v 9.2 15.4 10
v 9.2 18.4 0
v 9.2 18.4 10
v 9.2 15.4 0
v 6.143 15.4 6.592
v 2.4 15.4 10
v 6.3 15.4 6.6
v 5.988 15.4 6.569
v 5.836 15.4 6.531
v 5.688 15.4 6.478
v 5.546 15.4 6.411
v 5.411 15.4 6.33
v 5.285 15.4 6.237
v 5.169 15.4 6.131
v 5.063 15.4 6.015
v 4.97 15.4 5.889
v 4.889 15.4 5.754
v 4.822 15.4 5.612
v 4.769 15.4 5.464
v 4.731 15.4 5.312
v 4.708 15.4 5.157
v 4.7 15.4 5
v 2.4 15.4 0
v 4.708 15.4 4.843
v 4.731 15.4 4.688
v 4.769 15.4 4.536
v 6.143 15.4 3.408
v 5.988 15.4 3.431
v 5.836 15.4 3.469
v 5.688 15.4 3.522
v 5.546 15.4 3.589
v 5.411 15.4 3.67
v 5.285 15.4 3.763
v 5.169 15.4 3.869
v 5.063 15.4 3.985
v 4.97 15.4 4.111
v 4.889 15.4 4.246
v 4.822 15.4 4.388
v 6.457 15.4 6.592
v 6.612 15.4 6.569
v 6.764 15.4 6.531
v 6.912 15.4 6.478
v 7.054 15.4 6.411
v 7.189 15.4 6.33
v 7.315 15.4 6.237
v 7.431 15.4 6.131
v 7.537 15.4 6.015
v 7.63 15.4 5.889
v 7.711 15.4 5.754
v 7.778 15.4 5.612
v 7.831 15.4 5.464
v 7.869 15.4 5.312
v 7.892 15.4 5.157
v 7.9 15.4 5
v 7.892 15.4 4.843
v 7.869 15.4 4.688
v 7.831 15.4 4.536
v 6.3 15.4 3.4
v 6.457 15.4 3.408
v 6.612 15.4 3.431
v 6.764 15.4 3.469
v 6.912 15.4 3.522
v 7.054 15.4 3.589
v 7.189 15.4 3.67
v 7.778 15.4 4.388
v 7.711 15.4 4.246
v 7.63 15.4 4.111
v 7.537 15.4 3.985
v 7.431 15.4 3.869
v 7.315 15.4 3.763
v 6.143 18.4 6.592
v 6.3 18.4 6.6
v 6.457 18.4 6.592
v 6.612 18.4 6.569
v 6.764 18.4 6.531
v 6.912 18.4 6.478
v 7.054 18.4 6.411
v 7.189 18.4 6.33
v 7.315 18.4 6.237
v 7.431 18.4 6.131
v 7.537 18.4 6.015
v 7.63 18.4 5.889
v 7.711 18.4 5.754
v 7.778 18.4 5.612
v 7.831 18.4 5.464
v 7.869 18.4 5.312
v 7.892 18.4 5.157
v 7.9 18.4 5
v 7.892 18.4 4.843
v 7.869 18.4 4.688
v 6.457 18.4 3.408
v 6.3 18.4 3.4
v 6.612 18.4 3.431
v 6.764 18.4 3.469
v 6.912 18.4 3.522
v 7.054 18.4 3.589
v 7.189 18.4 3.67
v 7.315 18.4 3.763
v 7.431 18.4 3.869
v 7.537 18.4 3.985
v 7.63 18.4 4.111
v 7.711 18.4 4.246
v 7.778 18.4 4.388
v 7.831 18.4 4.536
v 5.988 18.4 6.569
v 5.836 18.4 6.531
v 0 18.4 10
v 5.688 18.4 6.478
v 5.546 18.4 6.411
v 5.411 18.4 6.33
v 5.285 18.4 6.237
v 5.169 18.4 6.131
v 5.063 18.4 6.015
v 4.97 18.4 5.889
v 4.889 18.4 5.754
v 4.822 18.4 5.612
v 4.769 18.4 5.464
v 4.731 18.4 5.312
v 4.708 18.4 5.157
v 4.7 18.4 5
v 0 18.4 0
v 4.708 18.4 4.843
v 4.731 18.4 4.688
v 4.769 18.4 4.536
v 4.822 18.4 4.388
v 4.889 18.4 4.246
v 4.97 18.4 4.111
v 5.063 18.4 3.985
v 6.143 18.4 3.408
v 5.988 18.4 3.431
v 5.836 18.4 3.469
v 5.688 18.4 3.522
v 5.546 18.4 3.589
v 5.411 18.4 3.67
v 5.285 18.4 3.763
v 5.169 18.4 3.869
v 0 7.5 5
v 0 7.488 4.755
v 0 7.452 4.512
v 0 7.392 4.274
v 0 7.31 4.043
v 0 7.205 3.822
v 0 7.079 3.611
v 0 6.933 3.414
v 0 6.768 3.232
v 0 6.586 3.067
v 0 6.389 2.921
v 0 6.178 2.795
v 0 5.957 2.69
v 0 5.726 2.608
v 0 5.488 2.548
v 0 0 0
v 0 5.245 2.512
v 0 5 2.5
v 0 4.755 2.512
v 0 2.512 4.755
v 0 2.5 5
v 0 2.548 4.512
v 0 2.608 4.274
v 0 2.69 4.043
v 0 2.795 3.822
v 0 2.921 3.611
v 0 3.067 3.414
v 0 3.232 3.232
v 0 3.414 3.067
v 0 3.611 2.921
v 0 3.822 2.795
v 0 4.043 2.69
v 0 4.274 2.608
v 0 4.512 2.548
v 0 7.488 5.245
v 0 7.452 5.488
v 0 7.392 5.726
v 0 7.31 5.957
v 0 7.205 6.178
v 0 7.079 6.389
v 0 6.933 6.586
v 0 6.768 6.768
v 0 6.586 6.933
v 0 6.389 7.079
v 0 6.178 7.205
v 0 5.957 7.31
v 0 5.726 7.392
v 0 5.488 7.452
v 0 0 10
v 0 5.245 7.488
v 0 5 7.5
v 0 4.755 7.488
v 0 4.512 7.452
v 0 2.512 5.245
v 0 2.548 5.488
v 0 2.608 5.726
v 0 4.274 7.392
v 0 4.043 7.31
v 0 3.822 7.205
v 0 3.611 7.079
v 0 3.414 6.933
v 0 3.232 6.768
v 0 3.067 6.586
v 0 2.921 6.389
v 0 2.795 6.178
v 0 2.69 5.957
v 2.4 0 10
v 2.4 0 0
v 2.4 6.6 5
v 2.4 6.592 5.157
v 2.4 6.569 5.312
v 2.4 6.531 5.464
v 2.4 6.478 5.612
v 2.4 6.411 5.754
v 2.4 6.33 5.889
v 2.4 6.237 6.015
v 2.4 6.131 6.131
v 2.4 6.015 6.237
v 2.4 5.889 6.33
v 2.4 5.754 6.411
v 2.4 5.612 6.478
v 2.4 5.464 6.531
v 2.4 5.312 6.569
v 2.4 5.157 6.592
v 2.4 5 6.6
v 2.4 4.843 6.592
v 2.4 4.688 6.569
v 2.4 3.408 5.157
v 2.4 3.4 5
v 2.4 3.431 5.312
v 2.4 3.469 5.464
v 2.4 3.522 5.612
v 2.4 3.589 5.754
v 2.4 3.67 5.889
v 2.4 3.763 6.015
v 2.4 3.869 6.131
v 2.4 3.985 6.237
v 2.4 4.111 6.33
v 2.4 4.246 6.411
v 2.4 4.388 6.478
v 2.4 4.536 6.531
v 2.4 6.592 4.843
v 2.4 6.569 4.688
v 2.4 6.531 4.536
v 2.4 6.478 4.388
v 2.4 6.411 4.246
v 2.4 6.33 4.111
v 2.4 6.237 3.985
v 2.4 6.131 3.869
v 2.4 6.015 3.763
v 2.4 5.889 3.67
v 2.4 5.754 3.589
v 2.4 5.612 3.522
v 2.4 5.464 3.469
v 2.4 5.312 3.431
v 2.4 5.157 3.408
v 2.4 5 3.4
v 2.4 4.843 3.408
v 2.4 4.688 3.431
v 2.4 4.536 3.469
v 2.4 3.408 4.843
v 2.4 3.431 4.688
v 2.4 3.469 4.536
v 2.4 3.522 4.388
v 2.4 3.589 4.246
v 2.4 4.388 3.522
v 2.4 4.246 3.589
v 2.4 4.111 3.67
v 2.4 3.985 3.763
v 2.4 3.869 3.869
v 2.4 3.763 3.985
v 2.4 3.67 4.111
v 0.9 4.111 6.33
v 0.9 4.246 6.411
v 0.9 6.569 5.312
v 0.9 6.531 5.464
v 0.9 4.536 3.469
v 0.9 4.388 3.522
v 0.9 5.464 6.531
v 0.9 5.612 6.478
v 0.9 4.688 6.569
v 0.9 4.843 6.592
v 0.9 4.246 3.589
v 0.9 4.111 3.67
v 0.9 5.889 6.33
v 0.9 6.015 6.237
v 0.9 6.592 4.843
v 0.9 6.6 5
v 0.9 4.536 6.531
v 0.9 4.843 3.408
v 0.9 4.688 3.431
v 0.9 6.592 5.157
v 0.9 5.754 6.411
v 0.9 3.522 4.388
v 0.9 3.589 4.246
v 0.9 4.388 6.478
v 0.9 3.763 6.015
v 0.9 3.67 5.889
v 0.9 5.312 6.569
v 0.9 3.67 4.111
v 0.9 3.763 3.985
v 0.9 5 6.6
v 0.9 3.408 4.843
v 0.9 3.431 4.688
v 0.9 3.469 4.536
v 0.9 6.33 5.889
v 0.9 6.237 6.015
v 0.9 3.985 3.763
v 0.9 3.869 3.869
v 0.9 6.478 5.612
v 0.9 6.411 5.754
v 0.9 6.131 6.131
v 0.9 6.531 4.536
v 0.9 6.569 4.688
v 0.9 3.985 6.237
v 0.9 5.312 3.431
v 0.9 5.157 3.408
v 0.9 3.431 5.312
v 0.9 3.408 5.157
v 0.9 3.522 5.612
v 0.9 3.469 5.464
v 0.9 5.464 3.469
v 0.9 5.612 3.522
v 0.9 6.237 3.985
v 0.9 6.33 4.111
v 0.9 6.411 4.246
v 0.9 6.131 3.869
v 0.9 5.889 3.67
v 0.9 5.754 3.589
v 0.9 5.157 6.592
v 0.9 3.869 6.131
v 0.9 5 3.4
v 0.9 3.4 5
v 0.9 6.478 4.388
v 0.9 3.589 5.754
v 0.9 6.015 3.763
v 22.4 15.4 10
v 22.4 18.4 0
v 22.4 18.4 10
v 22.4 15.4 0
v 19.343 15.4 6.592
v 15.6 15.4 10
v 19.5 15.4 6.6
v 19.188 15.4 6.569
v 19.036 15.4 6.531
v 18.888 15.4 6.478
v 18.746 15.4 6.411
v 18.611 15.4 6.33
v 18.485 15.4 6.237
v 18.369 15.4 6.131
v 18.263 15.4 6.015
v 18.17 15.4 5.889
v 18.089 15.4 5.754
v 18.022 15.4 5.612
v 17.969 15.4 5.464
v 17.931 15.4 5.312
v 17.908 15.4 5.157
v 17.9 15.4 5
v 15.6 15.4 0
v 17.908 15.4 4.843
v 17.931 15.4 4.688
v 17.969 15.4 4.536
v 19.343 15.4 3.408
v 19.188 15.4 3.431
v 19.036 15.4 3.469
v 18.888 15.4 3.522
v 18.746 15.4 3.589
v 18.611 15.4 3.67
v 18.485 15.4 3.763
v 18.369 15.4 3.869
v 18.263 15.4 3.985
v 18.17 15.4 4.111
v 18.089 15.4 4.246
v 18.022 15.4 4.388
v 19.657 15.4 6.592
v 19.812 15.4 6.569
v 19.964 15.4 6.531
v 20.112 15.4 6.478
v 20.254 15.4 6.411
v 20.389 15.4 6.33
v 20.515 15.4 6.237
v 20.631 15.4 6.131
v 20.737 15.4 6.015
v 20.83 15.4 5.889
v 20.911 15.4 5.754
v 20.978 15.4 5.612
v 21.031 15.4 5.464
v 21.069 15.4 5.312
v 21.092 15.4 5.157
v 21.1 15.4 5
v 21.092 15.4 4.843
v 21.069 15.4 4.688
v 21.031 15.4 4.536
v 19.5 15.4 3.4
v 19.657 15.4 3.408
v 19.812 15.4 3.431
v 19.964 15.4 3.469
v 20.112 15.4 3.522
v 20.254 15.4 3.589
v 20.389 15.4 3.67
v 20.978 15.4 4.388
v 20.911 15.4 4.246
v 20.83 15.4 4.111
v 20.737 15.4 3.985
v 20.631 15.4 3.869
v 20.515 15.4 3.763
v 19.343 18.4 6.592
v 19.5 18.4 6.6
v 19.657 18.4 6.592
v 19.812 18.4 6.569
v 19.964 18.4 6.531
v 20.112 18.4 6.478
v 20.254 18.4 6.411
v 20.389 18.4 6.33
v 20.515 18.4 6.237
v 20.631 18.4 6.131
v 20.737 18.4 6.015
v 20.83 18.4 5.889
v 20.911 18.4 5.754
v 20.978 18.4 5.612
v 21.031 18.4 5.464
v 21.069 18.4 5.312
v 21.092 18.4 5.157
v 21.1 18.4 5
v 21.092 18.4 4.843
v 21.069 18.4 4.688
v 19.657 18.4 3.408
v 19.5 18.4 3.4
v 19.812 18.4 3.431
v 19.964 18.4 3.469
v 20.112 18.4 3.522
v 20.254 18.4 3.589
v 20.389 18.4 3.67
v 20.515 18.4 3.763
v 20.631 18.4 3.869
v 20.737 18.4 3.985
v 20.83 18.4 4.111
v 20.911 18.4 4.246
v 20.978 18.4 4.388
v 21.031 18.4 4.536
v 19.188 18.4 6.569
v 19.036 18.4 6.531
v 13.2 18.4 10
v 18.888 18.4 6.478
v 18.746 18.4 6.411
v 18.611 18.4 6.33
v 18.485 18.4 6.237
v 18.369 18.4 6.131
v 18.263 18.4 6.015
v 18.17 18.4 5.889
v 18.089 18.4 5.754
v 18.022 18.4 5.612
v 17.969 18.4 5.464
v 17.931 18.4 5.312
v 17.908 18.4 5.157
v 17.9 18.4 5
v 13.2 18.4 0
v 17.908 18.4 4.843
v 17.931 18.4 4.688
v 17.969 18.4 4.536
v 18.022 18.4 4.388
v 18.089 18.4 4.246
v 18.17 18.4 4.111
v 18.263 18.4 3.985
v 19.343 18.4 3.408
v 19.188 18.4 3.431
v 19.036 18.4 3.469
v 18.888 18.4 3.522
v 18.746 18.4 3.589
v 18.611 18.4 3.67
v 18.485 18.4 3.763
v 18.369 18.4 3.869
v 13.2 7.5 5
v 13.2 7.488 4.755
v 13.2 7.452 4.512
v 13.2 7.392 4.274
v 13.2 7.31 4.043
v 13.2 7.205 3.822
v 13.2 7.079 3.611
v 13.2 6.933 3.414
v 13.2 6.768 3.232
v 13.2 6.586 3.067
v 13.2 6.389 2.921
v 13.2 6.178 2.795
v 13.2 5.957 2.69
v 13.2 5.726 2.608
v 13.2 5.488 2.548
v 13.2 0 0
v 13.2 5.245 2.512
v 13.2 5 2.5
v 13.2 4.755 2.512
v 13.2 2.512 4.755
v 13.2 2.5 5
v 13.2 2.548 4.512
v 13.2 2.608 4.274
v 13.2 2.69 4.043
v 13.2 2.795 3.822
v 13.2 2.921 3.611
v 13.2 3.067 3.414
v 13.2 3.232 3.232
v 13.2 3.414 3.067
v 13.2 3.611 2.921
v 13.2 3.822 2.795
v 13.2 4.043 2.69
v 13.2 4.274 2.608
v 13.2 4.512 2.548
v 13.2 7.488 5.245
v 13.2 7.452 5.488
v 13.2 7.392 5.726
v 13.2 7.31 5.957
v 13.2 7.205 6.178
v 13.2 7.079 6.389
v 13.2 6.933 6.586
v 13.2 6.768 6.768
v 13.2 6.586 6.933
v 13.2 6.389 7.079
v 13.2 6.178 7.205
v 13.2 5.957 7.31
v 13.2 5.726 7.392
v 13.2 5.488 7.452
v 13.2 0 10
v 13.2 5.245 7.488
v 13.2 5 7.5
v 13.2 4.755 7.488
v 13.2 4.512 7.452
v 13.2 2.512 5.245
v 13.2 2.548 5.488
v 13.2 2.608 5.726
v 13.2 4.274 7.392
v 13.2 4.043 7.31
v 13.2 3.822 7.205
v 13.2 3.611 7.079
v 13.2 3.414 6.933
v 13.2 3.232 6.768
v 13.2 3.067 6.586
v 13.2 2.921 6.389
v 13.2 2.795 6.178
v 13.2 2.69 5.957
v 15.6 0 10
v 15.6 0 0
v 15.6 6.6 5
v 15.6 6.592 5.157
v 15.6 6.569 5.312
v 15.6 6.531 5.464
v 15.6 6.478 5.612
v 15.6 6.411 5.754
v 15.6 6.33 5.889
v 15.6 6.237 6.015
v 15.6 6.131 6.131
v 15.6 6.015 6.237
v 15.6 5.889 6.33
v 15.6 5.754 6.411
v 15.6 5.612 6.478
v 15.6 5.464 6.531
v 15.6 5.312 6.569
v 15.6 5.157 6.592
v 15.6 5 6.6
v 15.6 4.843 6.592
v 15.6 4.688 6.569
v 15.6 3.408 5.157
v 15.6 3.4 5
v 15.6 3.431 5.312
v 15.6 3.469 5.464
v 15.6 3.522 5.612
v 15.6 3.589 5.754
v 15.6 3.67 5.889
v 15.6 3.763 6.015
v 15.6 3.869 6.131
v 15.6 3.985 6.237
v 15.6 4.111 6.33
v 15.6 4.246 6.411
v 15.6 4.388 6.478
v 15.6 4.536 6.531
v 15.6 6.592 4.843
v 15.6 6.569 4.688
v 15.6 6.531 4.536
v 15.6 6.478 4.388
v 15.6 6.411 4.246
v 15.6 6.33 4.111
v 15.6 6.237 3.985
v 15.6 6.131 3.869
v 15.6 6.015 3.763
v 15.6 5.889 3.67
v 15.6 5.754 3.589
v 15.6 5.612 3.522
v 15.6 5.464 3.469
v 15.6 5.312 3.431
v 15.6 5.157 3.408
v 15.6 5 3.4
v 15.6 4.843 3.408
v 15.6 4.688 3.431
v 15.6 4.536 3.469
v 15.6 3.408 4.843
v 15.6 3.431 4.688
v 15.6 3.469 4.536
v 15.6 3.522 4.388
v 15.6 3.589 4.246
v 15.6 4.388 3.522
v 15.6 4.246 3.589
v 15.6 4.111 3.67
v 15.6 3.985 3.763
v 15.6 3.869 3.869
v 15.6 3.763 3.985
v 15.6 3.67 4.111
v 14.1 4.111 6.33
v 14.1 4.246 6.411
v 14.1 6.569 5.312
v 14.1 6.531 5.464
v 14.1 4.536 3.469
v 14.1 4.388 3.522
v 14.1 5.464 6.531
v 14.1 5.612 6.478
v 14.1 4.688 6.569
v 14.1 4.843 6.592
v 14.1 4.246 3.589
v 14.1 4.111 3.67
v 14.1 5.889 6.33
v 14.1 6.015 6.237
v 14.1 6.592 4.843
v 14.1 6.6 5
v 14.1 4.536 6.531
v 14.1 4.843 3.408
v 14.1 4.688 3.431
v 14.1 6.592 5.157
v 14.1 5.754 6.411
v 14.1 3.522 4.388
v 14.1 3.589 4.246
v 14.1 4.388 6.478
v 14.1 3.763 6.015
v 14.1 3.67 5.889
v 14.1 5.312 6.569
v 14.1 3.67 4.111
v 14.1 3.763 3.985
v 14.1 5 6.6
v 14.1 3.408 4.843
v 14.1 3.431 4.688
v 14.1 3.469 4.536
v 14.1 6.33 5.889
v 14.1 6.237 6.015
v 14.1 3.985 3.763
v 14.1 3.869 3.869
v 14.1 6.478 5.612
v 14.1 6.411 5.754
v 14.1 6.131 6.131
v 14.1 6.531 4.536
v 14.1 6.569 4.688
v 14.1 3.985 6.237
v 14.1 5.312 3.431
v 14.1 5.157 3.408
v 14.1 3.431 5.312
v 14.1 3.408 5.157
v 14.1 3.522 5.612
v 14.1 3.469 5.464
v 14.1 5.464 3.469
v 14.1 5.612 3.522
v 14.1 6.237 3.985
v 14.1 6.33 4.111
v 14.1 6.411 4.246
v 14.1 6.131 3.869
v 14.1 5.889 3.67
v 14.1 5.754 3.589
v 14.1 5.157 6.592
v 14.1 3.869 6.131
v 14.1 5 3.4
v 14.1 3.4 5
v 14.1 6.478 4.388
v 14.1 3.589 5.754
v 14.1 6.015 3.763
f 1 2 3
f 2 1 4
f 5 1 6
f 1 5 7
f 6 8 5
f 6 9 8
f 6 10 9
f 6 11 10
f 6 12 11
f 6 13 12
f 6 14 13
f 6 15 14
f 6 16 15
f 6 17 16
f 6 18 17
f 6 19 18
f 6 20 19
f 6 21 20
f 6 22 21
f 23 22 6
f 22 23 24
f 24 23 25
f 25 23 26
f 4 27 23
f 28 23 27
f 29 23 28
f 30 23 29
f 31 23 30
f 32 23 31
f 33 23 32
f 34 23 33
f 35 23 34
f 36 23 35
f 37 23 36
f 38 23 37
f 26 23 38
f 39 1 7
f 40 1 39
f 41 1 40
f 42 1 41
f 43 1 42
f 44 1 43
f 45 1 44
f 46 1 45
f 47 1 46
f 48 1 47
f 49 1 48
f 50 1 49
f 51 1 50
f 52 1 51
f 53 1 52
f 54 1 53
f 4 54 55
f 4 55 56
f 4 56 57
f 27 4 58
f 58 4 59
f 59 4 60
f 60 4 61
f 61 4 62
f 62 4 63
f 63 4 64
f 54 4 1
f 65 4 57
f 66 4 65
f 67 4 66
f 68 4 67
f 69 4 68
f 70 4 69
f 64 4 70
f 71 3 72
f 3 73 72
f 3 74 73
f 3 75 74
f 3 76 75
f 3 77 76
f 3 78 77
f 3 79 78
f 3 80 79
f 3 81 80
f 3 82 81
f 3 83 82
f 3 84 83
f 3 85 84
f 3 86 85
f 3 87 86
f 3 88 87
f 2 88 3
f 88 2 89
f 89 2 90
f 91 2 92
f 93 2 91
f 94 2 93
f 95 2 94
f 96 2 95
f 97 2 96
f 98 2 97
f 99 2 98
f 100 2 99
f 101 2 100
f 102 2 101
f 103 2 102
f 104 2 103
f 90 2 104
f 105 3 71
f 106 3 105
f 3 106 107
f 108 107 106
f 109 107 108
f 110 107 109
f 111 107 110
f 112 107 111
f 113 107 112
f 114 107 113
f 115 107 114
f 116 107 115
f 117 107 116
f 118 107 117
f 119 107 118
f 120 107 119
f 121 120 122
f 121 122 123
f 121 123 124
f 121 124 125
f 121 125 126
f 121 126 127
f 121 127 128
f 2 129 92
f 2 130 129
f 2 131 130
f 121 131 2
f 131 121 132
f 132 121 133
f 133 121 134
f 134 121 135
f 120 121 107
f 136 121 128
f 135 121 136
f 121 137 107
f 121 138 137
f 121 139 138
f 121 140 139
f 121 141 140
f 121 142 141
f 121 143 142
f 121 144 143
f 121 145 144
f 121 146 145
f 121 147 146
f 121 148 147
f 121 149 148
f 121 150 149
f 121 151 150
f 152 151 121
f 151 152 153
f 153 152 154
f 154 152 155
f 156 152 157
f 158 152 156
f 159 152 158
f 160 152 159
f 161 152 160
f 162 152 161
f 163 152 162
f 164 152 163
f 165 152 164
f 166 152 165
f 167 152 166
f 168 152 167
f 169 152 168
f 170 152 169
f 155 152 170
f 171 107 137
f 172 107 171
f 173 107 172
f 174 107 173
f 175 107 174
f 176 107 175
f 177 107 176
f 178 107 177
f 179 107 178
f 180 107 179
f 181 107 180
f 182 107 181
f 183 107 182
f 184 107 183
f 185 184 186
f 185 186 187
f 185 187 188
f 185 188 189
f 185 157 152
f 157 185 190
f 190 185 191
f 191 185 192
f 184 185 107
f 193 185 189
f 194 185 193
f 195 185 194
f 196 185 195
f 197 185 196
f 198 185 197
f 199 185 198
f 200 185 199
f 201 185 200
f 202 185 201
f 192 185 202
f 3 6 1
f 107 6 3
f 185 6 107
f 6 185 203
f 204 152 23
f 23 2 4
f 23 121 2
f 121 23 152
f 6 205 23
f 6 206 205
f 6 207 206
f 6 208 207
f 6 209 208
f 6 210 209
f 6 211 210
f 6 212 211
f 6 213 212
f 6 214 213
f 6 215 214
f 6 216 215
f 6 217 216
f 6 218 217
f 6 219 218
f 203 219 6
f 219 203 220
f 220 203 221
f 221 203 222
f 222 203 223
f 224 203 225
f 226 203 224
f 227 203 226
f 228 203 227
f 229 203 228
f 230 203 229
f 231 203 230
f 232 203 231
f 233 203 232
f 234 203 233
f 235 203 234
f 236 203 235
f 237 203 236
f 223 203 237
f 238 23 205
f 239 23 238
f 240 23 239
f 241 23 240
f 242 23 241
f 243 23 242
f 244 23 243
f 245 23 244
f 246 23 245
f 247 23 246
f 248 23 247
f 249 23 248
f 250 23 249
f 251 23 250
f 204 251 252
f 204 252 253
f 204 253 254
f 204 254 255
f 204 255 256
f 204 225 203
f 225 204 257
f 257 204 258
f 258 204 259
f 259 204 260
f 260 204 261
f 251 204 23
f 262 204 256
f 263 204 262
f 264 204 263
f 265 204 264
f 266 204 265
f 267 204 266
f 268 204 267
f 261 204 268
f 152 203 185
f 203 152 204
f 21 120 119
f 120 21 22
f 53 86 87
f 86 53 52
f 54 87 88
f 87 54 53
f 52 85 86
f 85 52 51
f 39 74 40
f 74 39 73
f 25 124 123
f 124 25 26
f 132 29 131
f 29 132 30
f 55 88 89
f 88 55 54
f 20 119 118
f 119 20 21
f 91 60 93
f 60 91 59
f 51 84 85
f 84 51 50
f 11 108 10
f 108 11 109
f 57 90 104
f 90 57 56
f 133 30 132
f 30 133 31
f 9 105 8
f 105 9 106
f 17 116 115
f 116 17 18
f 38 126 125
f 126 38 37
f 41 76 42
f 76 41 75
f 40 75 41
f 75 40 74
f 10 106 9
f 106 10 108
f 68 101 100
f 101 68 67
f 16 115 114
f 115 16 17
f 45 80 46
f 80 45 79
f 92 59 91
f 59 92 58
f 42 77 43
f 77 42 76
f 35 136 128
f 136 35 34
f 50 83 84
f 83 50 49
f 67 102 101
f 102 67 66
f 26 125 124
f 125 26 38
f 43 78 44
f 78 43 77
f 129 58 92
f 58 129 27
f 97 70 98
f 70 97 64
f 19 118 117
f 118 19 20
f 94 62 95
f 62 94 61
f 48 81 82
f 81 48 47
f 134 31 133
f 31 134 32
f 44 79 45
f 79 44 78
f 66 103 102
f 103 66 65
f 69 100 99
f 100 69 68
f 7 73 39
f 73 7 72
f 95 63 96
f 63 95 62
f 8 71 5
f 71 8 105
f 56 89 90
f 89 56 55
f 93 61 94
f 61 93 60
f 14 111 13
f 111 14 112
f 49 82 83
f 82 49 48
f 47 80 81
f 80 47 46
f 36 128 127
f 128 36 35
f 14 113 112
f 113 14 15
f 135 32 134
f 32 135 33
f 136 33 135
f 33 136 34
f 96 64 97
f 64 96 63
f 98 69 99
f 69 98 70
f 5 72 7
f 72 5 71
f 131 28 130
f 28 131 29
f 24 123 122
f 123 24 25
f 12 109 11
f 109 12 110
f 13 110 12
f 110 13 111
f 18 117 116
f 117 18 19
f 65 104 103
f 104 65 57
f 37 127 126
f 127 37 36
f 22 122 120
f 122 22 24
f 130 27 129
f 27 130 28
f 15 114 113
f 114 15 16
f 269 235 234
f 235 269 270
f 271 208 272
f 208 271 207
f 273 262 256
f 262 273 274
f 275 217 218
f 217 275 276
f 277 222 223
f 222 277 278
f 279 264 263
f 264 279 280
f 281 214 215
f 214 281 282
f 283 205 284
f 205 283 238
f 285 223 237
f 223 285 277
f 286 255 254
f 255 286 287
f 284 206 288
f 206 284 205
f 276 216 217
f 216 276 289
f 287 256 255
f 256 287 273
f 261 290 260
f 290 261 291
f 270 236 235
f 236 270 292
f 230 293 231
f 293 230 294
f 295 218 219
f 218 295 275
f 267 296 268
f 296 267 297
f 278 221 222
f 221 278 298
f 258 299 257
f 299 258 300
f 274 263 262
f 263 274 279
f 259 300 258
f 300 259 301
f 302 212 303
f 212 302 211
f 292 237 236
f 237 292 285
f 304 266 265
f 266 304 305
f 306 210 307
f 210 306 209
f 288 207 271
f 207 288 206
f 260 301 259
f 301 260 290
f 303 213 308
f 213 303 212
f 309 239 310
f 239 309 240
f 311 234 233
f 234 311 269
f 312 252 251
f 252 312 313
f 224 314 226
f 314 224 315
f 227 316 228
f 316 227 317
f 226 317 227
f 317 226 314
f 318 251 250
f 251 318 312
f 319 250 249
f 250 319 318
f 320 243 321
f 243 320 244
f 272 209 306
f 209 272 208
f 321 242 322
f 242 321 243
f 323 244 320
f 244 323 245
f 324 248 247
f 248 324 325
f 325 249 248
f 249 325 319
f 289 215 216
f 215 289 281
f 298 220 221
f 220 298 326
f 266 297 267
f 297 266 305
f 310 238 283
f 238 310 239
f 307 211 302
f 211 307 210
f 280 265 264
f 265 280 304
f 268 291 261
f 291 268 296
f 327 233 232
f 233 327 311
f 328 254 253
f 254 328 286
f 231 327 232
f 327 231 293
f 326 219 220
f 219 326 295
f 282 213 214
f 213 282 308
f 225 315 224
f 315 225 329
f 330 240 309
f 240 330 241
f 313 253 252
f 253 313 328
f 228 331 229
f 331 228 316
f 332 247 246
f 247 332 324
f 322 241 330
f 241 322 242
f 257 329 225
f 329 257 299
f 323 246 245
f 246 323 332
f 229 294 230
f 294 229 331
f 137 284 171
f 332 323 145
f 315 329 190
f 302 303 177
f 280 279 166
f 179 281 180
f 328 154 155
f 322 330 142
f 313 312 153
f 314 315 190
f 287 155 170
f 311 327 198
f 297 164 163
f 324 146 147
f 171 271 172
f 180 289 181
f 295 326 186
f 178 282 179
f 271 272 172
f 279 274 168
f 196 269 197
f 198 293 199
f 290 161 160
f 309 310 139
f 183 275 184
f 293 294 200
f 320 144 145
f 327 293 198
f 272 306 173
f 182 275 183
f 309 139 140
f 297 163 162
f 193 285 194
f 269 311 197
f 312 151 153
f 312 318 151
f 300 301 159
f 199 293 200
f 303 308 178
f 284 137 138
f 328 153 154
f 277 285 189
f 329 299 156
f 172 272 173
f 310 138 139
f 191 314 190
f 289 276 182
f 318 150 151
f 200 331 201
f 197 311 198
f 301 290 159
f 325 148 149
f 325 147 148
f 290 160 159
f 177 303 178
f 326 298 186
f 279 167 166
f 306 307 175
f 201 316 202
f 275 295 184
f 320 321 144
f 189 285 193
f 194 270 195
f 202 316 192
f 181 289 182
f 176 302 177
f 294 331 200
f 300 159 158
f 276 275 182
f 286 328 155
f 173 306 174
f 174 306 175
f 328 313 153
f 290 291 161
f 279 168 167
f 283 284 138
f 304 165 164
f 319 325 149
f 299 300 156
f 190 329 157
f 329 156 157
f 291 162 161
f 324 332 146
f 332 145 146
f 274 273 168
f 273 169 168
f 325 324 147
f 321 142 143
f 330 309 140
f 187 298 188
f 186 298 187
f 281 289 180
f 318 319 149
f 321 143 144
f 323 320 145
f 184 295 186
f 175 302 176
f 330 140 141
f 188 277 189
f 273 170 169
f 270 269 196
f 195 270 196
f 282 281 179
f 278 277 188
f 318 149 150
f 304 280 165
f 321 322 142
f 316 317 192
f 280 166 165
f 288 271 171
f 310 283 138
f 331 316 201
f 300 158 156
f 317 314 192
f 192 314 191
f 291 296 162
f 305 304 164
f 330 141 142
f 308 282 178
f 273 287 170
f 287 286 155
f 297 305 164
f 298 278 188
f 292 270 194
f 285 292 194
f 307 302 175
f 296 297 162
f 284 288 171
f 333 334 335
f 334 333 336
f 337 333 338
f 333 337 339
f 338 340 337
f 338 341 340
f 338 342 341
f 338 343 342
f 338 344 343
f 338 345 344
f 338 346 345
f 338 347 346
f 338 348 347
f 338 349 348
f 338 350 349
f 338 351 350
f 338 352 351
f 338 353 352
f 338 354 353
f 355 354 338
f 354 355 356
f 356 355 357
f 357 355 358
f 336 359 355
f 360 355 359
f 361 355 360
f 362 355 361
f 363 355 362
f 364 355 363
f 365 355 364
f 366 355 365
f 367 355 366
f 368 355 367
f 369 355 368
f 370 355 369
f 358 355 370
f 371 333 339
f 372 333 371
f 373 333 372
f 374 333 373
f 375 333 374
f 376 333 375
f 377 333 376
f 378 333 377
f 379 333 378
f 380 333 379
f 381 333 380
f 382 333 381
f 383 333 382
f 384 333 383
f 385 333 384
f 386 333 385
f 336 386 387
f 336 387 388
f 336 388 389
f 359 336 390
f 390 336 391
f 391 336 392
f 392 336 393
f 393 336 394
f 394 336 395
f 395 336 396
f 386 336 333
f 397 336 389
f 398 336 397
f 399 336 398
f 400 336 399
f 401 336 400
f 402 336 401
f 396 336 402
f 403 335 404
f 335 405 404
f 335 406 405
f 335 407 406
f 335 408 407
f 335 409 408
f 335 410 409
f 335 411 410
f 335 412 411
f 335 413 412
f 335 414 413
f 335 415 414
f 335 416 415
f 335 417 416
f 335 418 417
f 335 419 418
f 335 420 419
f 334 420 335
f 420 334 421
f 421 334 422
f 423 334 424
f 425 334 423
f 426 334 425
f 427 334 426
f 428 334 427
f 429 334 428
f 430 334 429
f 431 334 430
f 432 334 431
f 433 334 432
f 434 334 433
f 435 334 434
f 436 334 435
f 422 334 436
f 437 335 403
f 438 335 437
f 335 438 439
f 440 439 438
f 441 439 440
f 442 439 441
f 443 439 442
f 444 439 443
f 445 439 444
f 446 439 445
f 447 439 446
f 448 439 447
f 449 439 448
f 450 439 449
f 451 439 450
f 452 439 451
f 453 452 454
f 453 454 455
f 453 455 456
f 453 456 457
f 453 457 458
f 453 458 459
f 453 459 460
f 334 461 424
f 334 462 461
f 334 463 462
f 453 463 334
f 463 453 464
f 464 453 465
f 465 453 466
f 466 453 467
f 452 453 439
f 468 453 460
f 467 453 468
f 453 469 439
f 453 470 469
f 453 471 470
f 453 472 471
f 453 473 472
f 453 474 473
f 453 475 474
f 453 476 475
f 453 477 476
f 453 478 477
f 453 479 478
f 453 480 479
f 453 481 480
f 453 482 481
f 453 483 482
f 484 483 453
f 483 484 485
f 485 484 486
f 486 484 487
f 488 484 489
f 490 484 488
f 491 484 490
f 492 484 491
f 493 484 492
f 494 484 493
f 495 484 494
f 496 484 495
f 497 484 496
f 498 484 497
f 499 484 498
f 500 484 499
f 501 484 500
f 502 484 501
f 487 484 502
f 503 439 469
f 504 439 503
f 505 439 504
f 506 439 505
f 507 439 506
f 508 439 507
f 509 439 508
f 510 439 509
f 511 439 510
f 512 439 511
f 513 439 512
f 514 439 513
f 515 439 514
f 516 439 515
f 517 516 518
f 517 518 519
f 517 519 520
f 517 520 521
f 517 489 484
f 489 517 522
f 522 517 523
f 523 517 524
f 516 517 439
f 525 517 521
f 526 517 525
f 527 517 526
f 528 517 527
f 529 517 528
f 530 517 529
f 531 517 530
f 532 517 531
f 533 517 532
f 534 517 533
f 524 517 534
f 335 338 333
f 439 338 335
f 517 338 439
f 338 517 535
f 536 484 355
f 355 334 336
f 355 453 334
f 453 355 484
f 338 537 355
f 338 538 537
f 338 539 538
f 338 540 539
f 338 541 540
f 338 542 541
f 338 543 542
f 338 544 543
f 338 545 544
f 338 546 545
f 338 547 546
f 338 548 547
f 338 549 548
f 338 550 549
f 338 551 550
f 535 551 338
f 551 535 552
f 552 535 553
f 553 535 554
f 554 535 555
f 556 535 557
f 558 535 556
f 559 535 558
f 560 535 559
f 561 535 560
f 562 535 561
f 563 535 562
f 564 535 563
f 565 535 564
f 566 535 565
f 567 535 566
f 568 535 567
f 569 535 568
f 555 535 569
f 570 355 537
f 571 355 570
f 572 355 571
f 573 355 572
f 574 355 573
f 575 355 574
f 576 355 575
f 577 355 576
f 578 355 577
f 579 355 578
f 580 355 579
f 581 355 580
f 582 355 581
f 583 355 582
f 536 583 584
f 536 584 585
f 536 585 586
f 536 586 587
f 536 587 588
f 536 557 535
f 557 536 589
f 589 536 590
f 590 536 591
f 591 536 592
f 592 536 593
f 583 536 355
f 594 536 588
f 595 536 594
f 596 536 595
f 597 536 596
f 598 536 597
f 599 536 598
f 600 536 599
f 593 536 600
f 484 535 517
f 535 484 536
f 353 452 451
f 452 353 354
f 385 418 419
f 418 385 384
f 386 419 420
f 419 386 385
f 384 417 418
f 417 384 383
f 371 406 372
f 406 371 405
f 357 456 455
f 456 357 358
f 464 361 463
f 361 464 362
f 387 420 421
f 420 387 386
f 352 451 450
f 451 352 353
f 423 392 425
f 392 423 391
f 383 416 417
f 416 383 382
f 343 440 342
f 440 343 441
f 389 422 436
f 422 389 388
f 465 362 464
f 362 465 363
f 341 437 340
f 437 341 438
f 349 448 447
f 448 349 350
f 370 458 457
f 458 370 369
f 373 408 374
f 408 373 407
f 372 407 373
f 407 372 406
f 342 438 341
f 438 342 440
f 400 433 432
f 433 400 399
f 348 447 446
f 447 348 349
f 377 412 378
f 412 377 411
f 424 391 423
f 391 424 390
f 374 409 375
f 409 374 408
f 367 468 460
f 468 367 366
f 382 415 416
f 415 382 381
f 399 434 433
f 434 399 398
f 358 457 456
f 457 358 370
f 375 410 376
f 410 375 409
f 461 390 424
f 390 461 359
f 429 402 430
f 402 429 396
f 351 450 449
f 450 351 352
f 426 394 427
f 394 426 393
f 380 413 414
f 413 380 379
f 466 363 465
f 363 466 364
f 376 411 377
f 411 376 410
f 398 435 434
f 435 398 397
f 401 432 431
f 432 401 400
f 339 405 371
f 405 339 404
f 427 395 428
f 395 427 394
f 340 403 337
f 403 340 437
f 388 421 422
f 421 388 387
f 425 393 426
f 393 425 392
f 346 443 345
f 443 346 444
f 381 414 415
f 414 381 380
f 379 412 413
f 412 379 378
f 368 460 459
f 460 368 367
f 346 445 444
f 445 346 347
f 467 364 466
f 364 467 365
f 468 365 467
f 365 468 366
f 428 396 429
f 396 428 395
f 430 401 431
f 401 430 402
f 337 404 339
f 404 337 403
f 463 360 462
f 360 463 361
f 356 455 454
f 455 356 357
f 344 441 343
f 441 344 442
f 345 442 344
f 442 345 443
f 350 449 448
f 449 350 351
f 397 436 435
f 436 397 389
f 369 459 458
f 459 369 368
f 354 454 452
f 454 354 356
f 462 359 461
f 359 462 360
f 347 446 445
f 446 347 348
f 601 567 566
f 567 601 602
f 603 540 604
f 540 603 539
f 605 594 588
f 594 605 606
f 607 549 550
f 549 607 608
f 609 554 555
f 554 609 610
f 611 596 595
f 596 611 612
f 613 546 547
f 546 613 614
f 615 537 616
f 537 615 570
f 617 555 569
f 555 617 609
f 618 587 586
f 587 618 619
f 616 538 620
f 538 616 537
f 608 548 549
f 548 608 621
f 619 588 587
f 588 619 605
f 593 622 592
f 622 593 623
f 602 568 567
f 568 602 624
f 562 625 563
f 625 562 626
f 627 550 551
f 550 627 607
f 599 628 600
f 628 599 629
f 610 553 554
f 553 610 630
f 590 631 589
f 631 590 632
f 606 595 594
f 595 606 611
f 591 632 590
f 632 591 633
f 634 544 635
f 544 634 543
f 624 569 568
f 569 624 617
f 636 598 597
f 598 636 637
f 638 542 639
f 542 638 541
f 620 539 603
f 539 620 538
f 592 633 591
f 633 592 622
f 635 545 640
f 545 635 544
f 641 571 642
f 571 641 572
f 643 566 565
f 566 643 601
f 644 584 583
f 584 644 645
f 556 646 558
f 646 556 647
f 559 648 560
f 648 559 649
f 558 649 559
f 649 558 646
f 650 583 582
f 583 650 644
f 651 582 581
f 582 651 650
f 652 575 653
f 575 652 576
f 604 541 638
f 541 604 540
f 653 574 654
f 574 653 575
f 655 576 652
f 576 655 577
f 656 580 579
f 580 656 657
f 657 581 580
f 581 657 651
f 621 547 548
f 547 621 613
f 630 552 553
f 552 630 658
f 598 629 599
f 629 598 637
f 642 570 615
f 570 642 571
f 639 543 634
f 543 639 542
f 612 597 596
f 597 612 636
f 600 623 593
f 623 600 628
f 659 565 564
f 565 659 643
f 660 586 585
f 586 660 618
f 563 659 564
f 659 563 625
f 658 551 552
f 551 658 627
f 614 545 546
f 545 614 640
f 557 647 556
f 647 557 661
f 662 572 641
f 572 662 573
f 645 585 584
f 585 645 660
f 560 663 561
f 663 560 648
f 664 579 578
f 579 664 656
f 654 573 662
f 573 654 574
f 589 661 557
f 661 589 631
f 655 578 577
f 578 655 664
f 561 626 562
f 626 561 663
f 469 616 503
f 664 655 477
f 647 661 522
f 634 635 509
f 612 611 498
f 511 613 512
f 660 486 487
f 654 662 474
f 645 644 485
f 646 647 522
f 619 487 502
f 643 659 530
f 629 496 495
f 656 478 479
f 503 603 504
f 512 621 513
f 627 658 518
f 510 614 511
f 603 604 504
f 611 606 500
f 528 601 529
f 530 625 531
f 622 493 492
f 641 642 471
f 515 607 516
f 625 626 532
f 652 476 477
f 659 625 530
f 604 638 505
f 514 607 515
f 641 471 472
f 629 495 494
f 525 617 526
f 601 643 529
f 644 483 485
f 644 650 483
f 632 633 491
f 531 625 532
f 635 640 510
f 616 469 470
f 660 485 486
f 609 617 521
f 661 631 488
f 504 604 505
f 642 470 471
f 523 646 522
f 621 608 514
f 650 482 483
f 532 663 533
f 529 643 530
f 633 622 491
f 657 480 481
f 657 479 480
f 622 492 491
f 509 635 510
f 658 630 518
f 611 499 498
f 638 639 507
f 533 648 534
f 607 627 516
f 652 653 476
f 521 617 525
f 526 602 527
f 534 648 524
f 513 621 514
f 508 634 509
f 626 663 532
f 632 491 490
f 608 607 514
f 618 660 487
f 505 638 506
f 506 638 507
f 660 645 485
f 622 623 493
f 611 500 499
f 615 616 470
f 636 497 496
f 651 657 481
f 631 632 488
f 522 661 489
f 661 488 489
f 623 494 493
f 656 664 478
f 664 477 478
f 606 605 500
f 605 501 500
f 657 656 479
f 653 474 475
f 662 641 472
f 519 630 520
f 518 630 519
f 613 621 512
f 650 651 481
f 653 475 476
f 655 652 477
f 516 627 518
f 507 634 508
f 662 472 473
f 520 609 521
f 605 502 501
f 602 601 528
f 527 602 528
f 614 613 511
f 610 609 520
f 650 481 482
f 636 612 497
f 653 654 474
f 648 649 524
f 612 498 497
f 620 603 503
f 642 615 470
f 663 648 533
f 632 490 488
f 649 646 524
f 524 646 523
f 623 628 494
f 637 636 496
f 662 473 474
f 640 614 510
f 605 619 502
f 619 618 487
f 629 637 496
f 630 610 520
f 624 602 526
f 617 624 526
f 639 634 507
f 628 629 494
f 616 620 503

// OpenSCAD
// A4.1: TWO IDENTICAL PLAIN L BRACKETS. mm. ABS fit prototype.
// No captive nuts, pockets, roofs, inserts or standoffs. Two bores per part.
// Local origin = assembly X0.1, Y=centre-5, Z1.6. Centres Y22 and Y106.5.
// Upright touches main PCB BACK face X2.5, not its component face.
// Front: M3x8 pan/button screw + loose M3 nut; hole assembly X6.4.
// Side: M3x8 90-degree flat countersunk screw + loose nut on PCB F.Cu side.
// Countersink is in printed plastic ONLY, never in the 1.6mm PCB or panel.
// Use plain nuts AF<=5.5, thickness<=2.4; no washers in these length stacks.
// Print L outline flat as arranged; measure ABS shrinkage and bore fit.
// No STL/slicer/strength/physical-fit qualification is claimed.
$fn=64;
width_x=9.2;
width_y=10;
depth_z=18.4;
foot=3.0;          // panel foot, unchanged
web=2.4;           // PCB upright: 0.6mm thinner than the old 3.0mm wall
front_x=6.3;
side_z=13.4;
clearance=3.2;
countersink_diameter=5.0;  // M3 flat head, 5.0mm max diameter
countersink_depth=0.9;     // 90 degrees: (5.0-3.2)/2; leaves 1.5mm

module bracket() {
    difference() {
        union() {
            cube([width_x,width_y,foot]);
            cube([web,width_y,depth_z]);
        }
        // Front/panel hole along Z, accessible loose nut above foot.
        translate([front_x,width_y/2,-.1])
            cylinder(h=foot+.2,d=clearance);
        // Side hole along X. Screw head flush with OUTER/left plastic face.
        translate([-.1,width_y/2,side_z]) rotate([0,90,0])
            cylinder(h=web+.2,d=clearance);
        translate([0,width_y/2,side_z]) rotate([0,90,0])
            cylinder(h=countersink_depth,d1=countersink_diameter,d2=clearance);
    }
}
// Flat L-profile print orientation; local Y is the print height (10mm).
translate([0,depth_z,0]) rotate([90,0,0]) bracket();
translate([width_x+4,depth_z,0]) rotate([90,0,0]) bracket();
